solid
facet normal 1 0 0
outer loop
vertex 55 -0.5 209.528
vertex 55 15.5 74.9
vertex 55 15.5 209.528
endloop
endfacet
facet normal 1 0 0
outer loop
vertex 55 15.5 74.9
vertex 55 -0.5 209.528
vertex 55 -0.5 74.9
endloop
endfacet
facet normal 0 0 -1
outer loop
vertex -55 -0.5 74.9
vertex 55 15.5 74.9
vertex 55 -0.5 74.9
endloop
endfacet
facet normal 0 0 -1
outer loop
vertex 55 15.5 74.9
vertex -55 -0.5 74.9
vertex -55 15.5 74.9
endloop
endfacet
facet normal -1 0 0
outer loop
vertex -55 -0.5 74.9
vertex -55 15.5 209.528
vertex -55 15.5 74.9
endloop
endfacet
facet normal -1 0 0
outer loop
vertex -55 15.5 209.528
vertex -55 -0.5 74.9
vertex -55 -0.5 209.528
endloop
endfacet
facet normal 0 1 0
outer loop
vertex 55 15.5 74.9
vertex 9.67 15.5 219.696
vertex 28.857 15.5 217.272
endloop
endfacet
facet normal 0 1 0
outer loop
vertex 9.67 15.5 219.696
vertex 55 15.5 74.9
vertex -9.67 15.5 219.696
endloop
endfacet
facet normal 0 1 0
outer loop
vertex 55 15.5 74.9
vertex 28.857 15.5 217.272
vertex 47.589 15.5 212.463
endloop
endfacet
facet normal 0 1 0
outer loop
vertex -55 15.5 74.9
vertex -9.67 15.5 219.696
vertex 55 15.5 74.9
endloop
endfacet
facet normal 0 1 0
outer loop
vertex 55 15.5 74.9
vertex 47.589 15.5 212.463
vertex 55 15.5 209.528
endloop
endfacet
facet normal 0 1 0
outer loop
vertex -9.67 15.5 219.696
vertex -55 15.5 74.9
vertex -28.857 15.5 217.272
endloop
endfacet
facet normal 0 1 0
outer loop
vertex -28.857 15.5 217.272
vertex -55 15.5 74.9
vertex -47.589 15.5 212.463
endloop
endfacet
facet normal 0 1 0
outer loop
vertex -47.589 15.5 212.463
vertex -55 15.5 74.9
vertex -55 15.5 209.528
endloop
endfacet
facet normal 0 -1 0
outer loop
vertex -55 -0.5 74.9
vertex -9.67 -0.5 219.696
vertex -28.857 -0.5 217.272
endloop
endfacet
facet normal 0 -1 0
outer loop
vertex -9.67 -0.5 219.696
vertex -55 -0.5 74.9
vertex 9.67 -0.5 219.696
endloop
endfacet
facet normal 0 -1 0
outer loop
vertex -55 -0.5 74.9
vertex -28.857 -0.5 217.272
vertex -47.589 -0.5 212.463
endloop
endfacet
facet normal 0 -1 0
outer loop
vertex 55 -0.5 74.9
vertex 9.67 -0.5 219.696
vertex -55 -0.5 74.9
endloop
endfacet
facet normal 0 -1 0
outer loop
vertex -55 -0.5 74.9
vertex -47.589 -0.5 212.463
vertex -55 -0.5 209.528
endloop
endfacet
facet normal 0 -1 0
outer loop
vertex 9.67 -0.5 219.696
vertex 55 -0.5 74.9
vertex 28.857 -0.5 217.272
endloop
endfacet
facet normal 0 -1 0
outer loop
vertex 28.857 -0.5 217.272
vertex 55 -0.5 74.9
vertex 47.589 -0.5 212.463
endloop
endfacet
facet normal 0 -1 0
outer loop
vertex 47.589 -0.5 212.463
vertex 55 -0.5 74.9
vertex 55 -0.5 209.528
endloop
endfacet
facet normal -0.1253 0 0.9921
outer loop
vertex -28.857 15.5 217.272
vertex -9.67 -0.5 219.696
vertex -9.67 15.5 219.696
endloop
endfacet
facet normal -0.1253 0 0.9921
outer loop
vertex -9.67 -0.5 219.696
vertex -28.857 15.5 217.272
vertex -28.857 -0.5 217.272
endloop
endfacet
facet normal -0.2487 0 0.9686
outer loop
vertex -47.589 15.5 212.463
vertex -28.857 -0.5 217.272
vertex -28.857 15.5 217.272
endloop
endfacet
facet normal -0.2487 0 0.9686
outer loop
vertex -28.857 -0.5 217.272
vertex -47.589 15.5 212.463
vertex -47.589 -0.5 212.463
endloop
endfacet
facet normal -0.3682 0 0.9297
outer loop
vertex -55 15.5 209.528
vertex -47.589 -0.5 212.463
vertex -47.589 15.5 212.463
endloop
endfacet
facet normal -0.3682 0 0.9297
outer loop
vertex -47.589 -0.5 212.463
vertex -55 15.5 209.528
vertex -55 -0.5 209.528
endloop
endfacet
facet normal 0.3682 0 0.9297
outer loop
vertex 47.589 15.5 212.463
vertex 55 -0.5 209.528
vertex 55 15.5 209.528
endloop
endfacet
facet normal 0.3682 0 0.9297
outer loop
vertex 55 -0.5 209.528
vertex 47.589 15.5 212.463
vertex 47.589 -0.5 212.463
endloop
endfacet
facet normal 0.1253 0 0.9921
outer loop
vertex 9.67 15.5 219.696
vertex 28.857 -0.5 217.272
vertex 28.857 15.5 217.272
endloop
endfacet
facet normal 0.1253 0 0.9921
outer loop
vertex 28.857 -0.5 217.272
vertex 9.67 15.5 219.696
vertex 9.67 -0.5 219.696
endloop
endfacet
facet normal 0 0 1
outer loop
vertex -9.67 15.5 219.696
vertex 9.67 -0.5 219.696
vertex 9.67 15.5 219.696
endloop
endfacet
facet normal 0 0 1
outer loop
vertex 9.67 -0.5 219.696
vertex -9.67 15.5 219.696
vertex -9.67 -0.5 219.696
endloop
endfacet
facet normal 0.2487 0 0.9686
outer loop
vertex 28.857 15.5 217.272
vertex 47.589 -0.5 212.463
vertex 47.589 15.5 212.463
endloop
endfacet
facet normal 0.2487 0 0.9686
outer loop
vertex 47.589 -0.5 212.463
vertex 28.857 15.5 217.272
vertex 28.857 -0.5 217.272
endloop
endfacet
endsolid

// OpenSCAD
arc_window_w = 110;
arc_window_h = 145;
arc_window_hatches = 2;
arc_window_pos = 75;

module arc_window_hole(wall_thickness=15, window_width=arc_window_w, window_height=arc_window_h,window_pos = arc_window_pos, wall_color=[1,1,1],wall_alpha=0.3)
{
    $fn = 50;
    r = 1.4 * window_width;
    dx = window_width / 2; 
    
    translate([0, wall_thickness/2, window_pos])
    intersection() {
        color(wall_color, 1.0) 
        translate([0,0,window_height/2-0.1])
        cube([window_width, wall_thickness+1, 
            window_height],center=true);
        
        color(wall_color, 1.0)
        translate([0,0, window_height - r])
        rotate([90,0,0]) 
        cylinder(h=wall_thickness+1, r=r, center=true); 
    }
}

// For testing
arc_window_hole();
